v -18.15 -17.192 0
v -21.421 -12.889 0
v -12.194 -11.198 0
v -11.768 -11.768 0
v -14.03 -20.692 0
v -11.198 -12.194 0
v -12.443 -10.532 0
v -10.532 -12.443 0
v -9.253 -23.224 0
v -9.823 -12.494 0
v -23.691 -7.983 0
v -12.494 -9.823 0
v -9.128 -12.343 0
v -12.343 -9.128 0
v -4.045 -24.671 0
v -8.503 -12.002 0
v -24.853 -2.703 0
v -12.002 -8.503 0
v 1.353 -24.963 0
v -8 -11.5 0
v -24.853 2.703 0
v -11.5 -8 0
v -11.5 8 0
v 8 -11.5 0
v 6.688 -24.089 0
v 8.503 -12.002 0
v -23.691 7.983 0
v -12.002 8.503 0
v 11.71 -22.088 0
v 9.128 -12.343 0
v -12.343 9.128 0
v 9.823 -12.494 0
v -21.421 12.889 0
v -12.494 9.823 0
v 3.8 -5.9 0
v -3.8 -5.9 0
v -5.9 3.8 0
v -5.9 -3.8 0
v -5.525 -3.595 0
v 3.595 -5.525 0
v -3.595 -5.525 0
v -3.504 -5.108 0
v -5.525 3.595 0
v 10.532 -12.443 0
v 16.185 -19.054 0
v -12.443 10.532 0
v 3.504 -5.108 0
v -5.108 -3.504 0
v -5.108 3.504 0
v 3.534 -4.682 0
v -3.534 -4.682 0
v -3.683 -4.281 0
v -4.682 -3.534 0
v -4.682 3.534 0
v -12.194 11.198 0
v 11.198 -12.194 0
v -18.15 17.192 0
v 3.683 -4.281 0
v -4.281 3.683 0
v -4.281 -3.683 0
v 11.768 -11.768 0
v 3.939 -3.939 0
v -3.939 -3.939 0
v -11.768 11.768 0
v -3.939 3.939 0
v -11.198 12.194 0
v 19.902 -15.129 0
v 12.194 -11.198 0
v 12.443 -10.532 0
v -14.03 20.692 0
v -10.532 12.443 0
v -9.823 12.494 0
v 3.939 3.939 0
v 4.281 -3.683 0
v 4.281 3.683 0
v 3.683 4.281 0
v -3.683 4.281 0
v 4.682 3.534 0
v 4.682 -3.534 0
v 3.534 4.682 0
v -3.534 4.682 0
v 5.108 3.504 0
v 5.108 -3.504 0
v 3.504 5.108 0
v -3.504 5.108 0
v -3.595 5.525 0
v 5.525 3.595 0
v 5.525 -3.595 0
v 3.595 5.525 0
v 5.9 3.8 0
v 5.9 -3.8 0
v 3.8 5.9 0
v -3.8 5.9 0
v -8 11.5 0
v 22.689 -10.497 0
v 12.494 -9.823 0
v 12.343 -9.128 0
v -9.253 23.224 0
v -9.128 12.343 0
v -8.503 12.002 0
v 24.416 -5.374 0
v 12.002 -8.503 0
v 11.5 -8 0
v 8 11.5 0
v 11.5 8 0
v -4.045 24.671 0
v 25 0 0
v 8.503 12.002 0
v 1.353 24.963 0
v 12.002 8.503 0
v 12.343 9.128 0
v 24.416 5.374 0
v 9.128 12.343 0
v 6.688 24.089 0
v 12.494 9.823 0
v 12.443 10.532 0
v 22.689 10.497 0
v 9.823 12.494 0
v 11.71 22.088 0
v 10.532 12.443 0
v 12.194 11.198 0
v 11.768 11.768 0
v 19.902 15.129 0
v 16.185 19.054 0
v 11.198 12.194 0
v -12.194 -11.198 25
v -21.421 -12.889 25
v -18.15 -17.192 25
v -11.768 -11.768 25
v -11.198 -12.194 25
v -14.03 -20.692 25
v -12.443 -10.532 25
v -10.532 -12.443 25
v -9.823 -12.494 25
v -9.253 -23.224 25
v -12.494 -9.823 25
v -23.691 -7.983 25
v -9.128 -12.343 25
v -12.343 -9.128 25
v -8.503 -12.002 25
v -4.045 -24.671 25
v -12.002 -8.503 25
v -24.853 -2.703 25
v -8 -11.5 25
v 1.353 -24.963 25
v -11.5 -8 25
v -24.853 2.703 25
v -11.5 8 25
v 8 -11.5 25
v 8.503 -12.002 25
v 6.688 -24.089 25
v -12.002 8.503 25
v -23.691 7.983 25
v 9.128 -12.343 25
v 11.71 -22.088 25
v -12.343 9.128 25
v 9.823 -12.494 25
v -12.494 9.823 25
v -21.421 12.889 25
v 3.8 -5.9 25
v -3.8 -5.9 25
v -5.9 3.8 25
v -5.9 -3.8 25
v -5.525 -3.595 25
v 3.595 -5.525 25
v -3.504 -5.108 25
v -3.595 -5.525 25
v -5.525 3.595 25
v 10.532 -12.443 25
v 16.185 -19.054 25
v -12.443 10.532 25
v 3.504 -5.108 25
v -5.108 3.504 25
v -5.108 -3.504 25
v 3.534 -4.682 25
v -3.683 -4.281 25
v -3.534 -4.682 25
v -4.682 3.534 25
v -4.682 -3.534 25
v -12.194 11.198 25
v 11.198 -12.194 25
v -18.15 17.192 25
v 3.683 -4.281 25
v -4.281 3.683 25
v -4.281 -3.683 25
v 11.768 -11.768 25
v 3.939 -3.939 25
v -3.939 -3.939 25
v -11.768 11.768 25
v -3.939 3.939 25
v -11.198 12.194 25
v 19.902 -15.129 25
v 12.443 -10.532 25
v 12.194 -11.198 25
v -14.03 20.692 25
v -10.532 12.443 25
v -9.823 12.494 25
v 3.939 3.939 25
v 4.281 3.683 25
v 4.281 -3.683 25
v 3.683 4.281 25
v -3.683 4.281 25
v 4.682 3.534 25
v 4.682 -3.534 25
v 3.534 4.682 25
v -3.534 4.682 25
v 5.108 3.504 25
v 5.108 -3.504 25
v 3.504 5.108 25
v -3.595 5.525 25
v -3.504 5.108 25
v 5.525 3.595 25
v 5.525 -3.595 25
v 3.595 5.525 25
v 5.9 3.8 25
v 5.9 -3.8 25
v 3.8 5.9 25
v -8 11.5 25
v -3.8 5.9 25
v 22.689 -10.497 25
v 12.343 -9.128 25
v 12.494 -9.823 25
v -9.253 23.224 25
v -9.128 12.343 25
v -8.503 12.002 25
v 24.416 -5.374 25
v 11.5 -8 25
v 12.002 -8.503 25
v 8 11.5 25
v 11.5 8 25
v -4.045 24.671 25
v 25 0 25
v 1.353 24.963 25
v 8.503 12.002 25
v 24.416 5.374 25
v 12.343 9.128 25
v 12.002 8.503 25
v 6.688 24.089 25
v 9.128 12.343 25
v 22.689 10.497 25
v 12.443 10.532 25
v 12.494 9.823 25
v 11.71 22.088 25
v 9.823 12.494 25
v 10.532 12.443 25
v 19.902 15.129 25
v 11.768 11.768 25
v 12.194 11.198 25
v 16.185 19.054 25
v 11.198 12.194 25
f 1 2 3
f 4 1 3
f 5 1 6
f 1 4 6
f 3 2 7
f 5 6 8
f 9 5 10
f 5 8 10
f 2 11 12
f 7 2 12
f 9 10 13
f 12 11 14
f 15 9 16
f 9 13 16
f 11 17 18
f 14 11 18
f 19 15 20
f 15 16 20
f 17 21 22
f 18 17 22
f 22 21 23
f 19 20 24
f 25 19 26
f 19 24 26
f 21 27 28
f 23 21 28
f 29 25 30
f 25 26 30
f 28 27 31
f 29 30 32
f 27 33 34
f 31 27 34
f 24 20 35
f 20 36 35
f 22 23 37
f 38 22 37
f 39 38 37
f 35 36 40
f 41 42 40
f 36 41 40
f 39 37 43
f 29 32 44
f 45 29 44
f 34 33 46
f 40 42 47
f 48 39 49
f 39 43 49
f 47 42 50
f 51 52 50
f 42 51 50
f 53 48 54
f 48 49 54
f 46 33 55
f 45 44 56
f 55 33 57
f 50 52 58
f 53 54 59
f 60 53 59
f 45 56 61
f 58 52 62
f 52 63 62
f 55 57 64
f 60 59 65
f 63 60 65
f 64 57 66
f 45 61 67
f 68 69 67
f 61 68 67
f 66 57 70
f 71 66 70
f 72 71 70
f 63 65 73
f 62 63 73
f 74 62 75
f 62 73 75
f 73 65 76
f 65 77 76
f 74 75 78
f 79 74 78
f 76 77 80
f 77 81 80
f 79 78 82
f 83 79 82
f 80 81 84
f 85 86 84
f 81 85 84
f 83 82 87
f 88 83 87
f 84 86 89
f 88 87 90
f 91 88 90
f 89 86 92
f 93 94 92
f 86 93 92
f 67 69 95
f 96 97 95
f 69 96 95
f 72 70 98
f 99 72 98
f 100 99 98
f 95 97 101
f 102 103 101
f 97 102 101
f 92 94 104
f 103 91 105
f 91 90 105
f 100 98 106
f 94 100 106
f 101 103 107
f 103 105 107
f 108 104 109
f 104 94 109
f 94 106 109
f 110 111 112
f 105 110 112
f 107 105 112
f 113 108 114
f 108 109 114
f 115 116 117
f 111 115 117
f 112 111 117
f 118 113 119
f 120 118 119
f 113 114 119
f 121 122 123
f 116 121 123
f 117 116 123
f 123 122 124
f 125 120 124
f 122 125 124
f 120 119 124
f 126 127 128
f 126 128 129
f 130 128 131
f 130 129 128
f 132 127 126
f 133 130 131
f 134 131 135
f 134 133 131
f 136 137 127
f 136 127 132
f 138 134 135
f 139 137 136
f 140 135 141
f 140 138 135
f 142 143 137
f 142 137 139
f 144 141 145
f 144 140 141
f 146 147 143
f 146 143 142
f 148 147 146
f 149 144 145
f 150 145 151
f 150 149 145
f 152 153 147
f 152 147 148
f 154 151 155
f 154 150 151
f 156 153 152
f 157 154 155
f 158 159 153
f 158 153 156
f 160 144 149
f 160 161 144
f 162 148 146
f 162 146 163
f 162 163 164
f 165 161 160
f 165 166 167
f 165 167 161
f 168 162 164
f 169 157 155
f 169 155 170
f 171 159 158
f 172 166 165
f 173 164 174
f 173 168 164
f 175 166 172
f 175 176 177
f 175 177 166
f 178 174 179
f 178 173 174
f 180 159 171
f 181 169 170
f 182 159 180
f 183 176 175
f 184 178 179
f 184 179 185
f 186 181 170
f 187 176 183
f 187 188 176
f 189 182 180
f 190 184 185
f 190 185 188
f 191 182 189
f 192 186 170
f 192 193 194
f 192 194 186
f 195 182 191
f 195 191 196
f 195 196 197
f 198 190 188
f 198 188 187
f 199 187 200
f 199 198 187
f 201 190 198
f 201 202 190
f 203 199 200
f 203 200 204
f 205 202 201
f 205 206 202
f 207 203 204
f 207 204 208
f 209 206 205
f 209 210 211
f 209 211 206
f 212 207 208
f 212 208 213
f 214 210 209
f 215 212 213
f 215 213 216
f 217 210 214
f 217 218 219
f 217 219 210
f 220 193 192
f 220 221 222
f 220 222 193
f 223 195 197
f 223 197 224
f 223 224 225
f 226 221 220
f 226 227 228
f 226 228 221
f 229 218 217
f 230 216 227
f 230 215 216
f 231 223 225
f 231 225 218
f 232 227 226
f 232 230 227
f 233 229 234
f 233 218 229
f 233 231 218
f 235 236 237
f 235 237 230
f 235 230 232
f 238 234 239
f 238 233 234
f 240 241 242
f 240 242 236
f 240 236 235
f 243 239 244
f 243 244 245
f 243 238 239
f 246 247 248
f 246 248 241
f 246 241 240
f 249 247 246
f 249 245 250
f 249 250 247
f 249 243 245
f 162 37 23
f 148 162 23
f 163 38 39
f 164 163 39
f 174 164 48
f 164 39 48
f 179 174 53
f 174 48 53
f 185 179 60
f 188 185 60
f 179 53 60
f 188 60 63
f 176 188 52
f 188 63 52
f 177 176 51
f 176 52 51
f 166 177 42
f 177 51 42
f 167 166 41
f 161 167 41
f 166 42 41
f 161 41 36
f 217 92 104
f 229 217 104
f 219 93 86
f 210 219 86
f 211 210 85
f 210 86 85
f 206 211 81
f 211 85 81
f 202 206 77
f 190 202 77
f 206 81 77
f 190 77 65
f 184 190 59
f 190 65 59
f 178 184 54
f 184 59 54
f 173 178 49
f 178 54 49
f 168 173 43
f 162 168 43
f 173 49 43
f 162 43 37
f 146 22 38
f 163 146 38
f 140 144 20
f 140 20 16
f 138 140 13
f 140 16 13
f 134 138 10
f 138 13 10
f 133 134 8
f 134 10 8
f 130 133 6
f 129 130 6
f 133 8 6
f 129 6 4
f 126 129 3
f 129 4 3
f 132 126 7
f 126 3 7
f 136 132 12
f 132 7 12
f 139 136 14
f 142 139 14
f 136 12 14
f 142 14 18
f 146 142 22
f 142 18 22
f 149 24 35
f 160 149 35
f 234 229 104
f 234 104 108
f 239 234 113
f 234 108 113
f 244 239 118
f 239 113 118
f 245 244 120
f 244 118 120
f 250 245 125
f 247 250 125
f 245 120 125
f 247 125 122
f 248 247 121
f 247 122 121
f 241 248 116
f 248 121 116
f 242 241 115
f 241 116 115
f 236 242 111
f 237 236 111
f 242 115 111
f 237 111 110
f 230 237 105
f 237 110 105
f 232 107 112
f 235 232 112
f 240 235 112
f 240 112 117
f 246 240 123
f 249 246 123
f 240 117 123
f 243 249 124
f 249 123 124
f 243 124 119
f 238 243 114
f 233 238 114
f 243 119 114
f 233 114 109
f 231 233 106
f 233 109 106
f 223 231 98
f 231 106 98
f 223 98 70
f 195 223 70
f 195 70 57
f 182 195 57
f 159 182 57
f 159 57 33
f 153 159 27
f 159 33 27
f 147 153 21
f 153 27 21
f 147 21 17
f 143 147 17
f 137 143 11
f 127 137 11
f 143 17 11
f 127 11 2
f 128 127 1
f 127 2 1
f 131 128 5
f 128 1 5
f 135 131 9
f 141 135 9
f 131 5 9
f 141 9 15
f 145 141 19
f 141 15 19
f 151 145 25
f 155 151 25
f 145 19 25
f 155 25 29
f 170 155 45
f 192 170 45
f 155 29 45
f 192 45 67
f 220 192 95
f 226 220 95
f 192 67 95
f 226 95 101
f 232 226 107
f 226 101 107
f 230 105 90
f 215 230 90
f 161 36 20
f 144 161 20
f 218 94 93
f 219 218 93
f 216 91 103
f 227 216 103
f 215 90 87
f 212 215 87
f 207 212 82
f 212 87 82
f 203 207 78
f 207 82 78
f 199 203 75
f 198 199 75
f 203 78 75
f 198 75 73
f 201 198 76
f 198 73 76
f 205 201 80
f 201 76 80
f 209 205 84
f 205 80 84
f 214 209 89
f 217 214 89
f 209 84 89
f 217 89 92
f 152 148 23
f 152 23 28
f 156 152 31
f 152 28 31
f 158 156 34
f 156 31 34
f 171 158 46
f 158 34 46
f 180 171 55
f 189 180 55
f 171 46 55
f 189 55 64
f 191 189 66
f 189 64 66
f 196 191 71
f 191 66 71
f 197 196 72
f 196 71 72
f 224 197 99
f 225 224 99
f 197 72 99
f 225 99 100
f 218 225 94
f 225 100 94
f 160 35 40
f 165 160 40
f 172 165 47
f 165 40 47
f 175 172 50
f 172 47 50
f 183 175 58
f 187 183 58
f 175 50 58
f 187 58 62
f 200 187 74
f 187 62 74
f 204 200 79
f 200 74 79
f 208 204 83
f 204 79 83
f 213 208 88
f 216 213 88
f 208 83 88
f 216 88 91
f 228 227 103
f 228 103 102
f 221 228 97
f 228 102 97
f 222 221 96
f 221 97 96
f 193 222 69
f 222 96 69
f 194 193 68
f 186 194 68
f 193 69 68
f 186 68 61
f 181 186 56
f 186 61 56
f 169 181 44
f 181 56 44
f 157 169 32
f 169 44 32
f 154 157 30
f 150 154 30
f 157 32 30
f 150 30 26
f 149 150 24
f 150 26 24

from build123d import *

# Parameters (mm, degrees)
F0_R     = 25
F1_DEPTH = 25


with BuildPart() as f1:
    # F0 (on Top) → F1 (new body)
    with BuildSketch(Plane.XY):
        Circle(F0_R)
        with BuildLine():
            Line((-11.5, -8), (-5.9, -3.8))
            ThreePointArc((-5.9, -3.8), (-3.93934, -3.93934), (-3.8, -5.9))
            Line((-3.8, -5.9), (-8, -11.5))
            ThreePointArc((-8, -11.5), (-11.767767, -11.767767), (-11.5, -8))
        make_face(mode=Mode.SUBTRACT)
        with BuildLine():
            ThreePointArc((11.5, -8), (11.767767, -11.767767), (8, -11.5))
            Line((8, -11.5), (3.8, -5.9))
            ThreePointArc((3.8, -5.9), (3.93934, -3.93934), (5.9, -3.8))
            Line((5.9, -3.8), (11.5, -8))
        make_face(mode=Mode.SUBTRACT)
        with BuildLine():
            ThreePointArc((-11.5, 8), (-11.767767, 11.767767), (-8, 11.5))
            Line((-8, 11.5), (-3.8, 5.9))
            ThreePointArc((-3.8, 5.9), (-3.93934, 3.93934), (-5.9, 3.8))
            Line((-5.9, 3.8), (-11.5, 8))
        make_face(mode=Mode.SUBTRACT)
        with BuildLine():
            Line((3.8, 5.9), (8, 11.5))
            ThreePointArc((8, 11.5), (11.767767, 11.767767), (11.5, 8))
            Line((11.5, 8), (5.9, 3.8))
            ThreePointArc((5.9, 3.8), (3.93934, 3.93934), (3.8, 5.9))
        make_face(mode=Mode.SUBTRACT)
    extrude(amount=F1_DEPTH)


solid = f1.part
